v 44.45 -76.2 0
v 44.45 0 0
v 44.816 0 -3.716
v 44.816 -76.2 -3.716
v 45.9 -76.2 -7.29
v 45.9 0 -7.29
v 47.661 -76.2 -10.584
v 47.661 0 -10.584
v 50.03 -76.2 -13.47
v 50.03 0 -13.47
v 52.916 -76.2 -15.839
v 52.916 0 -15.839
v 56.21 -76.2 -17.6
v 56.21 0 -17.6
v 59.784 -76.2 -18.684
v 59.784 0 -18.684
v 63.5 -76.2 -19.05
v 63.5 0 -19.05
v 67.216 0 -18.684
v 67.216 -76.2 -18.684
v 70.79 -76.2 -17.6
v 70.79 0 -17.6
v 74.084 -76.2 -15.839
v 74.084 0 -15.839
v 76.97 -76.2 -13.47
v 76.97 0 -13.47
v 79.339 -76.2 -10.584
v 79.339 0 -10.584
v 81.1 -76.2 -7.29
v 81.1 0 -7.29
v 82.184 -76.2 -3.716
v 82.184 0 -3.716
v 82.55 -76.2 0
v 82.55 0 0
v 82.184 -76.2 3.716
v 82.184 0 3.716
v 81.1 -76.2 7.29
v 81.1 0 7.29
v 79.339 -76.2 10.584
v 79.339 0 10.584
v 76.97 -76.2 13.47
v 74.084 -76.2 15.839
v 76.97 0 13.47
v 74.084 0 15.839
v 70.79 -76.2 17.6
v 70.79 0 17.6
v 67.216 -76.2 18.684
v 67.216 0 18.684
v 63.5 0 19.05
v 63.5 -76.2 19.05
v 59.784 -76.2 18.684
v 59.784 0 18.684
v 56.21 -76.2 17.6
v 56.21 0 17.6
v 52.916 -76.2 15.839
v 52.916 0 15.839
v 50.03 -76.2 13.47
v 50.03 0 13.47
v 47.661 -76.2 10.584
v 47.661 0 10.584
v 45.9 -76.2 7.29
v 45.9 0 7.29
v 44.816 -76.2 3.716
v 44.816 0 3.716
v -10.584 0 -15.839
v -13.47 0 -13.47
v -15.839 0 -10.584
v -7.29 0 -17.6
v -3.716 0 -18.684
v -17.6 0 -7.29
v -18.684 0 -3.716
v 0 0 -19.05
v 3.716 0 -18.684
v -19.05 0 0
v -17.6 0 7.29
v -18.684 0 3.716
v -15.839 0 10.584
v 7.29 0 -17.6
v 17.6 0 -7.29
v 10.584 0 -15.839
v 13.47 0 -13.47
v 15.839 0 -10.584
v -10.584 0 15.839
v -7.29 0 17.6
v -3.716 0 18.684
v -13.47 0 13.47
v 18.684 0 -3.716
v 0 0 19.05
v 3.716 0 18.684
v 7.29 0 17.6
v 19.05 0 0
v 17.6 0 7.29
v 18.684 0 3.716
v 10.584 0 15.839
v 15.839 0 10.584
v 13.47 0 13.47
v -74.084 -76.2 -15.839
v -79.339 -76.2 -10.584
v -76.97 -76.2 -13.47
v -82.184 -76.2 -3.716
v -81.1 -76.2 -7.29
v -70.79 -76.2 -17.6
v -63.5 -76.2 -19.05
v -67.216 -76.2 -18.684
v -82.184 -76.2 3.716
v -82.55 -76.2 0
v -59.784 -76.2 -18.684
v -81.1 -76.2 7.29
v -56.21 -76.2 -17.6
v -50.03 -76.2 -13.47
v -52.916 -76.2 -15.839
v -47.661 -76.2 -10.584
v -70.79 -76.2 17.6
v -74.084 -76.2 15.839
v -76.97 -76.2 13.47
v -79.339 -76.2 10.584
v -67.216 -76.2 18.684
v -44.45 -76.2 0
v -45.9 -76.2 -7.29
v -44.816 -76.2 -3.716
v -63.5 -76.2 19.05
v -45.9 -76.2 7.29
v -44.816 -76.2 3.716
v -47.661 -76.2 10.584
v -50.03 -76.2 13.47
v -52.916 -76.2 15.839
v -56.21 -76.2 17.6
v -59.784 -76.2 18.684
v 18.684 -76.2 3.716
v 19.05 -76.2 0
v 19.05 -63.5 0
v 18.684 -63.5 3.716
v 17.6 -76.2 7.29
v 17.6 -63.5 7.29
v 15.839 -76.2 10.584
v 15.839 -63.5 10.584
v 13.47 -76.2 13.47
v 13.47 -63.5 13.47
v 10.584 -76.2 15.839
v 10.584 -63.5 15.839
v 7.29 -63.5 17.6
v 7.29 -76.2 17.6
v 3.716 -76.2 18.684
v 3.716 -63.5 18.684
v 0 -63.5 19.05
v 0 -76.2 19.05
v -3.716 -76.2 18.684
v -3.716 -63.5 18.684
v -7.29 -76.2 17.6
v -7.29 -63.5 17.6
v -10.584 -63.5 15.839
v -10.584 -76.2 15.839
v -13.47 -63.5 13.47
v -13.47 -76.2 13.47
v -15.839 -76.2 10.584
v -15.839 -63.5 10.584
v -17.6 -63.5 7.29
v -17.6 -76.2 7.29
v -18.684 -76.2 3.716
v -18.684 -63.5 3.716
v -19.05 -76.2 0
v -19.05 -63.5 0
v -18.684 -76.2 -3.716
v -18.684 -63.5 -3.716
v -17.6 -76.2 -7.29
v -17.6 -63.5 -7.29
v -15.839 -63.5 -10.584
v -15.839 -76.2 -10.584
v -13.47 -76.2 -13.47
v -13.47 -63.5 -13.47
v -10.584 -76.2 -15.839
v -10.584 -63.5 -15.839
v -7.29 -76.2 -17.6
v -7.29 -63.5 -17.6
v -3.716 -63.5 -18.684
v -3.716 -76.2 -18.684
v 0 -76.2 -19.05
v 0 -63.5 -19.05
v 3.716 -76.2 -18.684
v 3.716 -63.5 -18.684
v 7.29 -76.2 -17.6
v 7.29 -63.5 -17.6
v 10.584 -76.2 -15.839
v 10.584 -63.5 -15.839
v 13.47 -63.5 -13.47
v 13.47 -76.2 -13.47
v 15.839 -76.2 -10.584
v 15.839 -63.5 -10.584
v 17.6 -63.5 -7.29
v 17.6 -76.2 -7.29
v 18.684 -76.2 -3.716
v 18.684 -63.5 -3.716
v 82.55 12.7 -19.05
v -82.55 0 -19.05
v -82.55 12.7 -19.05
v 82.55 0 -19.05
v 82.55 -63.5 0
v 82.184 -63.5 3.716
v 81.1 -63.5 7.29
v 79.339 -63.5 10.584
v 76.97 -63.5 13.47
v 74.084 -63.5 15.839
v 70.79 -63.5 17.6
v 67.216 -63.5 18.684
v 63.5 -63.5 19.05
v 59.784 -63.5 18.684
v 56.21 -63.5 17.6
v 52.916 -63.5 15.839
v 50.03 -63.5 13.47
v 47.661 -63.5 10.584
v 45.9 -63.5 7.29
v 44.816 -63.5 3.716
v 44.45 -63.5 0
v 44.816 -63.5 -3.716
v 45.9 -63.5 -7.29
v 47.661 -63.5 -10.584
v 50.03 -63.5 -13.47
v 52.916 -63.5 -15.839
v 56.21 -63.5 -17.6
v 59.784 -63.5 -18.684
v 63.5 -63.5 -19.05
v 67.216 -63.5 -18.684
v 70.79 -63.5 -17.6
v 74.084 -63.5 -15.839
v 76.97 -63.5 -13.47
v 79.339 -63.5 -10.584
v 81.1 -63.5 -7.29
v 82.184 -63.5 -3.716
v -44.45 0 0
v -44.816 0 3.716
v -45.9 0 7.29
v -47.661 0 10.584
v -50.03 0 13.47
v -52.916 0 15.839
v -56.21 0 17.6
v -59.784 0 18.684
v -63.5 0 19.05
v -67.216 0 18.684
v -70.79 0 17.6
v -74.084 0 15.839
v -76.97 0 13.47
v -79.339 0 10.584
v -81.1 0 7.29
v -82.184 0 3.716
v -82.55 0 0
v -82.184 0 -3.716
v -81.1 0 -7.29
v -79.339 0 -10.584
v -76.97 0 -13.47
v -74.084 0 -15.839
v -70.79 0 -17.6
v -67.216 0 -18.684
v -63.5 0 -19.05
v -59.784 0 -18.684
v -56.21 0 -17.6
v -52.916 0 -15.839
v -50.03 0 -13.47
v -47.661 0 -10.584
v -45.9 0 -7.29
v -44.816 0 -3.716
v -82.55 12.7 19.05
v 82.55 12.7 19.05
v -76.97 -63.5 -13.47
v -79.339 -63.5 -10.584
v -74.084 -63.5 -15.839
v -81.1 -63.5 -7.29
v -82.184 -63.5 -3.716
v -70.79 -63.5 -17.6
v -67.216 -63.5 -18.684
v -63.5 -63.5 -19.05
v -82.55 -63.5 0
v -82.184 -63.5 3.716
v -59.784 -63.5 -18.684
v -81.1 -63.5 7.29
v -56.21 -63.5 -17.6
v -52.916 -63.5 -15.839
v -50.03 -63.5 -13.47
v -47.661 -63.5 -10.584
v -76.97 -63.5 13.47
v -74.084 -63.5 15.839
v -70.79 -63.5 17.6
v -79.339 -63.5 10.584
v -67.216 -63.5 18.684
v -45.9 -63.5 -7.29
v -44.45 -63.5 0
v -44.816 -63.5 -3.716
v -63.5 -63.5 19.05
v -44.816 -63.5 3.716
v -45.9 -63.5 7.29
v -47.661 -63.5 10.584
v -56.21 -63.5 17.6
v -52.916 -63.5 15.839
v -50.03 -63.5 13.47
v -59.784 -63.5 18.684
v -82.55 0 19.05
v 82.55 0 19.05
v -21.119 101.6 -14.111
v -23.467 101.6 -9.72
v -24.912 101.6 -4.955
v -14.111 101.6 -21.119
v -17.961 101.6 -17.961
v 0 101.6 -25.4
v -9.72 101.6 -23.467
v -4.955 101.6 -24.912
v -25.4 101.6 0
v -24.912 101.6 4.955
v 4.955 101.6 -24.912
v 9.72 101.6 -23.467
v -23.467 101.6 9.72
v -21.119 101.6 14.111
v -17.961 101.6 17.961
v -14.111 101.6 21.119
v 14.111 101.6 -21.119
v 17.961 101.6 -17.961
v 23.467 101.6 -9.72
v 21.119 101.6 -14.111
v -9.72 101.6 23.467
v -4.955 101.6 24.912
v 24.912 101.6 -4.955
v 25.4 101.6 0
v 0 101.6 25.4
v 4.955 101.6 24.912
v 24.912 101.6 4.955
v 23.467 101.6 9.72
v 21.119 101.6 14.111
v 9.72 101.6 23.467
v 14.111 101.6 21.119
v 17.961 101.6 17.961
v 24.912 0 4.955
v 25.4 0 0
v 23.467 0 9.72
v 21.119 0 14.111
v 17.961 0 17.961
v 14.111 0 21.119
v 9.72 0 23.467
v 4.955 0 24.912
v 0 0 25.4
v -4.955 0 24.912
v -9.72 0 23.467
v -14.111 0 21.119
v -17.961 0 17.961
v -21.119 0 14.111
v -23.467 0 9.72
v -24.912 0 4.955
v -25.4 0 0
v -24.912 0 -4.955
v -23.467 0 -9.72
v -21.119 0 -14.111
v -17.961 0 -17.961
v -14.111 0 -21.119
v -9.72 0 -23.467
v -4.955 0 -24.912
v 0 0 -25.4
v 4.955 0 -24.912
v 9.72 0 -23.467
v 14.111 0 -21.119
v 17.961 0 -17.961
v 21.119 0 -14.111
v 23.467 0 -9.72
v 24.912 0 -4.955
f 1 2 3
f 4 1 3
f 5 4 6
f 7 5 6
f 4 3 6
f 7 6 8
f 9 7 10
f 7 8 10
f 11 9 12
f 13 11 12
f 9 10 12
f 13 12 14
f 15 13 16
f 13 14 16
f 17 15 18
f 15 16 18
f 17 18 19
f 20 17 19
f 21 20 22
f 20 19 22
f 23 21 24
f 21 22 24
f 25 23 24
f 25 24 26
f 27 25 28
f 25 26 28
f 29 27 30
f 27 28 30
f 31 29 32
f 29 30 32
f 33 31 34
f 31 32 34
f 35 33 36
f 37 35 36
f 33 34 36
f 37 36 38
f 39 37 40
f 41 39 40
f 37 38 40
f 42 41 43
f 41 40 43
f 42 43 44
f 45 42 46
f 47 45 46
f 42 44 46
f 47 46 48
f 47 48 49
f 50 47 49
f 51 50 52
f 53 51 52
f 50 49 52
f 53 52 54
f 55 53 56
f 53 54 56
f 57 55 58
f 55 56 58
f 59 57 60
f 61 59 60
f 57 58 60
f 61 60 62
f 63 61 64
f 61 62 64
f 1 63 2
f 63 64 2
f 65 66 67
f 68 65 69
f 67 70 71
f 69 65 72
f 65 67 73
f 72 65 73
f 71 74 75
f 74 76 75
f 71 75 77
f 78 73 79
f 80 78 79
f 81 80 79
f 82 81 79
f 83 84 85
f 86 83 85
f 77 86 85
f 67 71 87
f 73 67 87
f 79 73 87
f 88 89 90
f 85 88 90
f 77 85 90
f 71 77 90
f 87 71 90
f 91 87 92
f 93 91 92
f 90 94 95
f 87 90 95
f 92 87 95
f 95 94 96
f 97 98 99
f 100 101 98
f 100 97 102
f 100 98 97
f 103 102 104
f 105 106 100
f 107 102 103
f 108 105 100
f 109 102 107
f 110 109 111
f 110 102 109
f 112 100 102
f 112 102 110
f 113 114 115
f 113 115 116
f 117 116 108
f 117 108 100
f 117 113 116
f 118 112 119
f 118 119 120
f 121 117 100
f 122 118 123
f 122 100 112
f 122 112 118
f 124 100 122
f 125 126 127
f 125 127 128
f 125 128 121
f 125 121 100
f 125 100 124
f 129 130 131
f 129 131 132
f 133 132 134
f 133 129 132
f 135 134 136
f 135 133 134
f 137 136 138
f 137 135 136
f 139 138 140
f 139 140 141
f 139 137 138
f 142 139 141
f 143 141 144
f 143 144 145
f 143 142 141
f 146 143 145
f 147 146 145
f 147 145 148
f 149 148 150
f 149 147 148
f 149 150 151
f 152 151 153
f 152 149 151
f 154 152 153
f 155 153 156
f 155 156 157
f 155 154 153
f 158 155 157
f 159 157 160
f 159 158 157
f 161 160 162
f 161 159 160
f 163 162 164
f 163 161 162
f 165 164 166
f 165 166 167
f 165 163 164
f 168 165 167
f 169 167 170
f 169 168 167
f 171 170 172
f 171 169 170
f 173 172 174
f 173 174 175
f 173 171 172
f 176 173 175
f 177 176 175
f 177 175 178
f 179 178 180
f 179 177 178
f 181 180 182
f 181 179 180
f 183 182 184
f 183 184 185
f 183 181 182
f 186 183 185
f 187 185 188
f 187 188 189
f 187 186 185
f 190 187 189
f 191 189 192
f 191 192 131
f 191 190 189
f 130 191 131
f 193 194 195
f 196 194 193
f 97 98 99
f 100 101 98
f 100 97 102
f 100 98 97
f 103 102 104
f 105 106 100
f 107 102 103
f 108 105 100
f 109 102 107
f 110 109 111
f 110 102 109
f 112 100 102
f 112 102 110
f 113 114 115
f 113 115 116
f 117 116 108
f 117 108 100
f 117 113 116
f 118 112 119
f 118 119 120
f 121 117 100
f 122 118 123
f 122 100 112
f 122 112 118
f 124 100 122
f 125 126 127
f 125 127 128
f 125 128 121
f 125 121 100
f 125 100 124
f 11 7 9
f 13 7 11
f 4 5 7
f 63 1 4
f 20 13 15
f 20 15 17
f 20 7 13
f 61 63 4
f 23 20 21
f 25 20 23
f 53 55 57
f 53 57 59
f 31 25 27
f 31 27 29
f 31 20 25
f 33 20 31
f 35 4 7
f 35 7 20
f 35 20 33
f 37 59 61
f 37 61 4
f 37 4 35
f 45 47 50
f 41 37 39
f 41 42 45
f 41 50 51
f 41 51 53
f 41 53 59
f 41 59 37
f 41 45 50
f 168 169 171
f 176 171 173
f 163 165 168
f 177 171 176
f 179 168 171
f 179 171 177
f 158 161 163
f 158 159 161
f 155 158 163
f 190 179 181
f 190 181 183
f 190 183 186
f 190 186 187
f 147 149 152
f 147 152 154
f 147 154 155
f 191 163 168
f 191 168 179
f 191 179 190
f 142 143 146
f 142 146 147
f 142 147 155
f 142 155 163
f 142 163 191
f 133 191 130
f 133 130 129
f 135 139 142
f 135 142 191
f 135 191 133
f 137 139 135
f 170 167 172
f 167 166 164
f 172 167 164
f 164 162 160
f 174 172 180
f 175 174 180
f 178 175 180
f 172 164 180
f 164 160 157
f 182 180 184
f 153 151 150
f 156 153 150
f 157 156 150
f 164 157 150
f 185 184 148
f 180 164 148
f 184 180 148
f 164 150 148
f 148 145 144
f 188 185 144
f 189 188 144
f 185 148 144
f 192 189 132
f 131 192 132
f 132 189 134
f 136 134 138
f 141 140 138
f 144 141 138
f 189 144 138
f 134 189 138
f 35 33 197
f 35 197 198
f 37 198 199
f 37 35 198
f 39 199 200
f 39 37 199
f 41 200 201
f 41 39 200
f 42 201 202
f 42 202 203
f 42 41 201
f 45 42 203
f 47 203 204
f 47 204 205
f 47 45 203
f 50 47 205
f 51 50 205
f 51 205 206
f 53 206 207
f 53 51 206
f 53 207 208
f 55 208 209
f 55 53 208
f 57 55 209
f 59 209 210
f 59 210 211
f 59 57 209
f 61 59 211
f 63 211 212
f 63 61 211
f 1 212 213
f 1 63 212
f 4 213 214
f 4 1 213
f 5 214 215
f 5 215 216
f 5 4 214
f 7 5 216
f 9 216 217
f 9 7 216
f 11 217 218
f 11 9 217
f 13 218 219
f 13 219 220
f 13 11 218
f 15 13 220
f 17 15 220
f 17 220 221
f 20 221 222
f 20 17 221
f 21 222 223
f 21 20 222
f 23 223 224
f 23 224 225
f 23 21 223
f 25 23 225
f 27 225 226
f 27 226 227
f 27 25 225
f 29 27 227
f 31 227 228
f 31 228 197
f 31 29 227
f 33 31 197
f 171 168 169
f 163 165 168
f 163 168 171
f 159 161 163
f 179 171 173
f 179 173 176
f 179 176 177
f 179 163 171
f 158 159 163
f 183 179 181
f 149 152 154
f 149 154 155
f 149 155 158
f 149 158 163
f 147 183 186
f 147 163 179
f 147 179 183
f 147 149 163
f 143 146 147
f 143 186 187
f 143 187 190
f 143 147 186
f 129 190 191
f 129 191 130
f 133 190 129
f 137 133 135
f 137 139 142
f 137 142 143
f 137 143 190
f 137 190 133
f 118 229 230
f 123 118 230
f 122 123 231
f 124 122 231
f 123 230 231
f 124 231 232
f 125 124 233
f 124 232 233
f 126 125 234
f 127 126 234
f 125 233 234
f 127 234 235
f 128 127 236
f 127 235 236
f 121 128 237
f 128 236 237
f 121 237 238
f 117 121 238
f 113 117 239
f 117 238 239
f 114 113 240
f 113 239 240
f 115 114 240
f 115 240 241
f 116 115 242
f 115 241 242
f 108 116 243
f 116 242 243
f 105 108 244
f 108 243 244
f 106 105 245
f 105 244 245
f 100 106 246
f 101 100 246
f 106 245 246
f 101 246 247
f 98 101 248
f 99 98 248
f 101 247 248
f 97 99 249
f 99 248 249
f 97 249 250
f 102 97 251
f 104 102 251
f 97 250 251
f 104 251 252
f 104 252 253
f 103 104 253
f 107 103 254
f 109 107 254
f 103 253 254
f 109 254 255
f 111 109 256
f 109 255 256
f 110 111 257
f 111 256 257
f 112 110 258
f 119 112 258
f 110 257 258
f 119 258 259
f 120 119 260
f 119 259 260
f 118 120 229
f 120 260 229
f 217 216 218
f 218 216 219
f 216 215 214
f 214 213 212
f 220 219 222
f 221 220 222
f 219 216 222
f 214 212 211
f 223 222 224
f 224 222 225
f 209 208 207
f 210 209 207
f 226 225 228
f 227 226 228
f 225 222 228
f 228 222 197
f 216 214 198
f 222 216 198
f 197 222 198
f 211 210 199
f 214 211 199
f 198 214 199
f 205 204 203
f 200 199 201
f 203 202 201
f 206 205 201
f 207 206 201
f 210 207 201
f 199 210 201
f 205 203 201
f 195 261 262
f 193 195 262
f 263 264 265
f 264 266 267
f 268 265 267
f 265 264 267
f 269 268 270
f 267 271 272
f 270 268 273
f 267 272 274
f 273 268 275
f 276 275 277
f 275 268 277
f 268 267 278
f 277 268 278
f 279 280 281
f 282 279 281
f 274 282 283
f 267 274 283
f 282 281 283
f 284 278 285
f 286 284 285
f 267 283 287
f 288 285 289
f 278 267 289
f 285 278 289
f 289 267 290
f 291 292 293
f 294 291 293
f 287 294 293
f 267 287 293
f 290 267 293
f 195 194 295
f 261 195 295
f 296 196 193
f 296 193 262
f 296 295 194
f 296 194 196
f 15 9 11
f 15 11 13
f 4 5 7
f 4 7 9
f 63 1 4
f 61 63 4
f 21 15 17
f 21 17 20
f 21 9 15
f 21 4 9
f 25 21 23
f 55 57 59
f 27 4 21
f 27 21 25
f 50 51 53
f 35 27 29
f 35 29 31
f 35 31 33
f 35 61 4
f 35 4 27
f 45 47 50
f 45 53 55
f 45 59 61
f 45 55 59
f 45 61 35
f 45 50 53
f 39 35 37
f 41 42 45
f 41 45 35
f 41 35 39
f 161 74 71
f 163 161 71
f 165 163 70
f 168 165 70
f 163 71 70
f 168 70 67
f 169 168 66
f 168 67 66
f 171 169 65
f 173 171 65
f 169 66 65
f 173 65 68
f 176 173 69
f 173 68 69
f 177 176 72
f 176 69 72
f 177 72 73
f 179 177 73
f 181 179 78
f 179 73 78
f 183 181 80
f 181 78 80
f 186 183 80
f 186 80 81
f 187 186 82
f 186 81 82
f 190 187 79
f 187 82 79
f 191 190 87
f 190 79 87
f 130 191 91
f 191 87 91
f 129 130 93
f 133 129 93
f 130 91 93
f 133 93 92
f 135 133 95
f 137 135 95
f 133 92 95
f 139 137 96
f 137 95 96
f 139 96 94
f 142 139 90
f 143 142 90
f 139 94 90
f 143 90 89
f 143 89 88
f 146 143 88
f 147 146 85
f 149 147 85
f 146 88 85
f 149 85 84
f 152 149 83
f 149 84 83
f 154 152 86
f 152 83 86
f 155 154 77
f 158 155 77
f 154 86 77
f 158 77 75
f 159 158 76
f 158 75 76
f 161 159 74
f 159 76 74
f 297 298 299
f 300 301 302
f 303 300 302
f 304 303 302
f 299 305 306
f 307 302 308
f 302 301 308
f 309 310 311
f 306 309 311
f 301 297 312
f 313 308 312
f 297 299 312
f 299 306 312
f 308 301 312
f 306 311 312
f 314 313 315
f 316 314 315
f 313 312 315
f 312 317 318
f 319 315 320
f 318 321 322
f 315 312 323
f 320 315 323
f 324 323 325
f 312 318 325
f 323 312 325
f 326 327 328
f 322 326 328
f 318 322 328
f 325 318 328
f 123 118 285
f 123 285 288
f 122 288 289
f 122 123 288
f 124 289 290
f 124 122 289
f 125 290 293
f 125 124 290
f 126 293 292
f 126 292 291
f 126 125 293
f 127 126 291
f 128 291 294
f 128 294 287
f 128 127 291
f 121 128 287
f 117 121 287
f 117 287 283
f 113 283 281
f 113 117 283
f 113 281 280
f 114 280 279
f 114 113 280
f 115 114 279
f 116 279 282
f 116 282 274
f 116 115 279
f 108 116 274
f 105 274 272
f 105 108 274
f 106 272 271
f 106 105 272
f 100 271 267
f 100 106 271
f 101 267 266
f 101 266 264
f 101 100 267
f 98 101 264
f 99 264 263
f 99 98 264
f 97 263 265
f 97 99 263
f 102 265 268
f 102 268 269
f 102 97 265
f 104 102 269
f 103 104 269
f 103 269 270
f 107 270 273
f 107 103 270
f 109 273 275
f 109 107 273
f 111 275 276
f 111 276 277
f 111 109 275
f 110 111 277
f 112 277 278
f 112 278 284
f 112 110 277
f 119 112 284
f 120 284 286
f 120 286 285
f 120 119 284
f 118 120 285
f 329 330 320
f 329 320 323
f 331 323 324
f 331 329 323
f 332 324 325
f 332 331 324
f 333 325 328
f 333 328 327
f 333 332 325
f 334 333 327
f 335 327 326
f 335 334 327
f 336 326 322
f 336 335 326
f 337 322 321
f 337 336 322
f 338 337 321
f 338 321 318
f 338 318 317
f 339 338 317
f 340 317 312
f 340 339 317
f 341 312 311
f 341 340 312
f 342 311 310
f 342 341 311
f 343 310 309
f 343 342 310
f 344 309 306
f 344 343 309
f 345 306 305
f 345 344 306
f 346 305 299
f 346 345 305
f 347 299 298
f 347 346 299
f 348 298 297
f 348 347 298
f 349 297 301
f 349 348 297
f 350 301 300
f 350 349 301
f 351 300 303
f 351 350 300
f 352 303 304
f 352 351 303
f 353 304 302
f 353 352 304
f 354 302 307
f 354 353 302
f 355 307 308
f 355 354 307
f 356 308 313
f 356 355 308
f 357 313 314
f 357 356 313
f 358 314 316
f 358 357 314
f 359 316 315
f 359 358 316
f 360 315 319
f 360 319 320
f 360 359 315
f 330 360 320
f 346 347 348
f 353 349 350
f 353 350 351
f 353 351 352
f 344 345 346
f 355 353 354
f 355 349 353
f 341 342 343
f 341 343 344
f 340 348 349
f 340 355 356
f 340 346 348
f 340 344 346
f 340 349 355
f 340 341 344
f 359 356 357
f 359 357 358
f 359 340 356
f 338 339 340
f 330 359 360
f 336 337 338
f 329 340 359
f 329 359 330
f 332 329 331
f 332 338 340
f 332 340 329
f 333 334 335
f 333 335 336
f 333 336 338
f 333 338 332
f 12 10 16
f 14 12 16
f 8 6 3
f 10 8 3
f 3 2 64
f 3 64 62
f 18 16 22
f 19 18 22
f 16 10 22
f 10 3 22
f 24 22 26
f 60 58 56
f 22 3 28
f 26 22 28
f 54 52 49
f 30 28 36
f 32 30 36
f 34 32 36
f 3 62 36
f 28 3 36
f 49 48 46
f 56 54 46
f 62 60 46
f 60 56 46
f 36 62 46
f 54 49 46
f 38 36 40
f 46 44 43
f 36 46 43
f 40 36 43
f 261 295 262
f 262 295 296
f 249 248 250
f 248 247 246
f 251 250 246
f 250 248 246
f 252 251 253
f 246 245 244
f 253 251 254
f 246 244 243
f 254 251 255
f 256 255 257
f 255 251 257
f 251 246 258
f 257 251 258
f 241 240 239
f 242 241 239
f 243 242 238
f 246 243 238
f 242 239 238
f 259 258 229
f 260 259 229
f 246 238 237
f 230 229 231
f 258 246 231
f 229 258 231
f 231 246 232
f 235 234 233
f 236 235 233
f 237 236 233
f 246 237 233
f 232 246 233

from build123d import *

# Parameters (mm, degrees)
F0_R      = 19.05
F1_DEPTH  = 76.2
F1_FACE_R = 19.05
F2_W      = 165.1
F2_H      = 38.1
F3_DEPTH  = 12.7
F4_R      = 25.4
F5_DEPTH  = 101.6


with BuildPart() as f1:
    # F0 (on Front) → F1 (new body)
    with BuildSketch(Plane.XZ):
        with BuildLine():
            ThreePointArc((82.55, 0), (63.5, 19.05), (44.45, 0))
            ThreePointArc((44.45, 0), (63.5, -19.05), (82.55, 0))
        make_face()
        with BuildLine():
            Line((0, 0), (19.05, 0))
            ThreePointArc((19.05, 0), (0, 19.05), (-19.05, 0))
            Line((-19.05, 0), (0, 0))
        make_face()
        with Locations((-63.5, 0)):
            Circle(F0_R)
        with BuildLine():
            ThreePointArc((-19.05, 0), (0, -19.05), (19.05, 0))
            Line((19.05, 0), (0, 0))
            Line((0, 0), (-19.05, 0))
        make_face()
    extrude(amount=F1_DEPTH)


with BuildPart() as f3:
    # F1_face (on face) + F2 (on Front) → F3 (new body)
    with BuildSketch(Plane(origin=(-63.5, -76.2, 0), x_dir=(1, 0, 0), z_dir=(0, -1, 0))):
        Circle(F1_FACE_R)
        with Locations((63.5, 0)):
            Circle(F1_FACE_R)
        with Locations((127, 0)):
            Circle(F1_FACE_R)
    with BuildSketch(Plane.XZ):
        Rectangle(F2_W, F2_H)
    extrude(amount=-F3_DEPTH)


with BuildPart() as f5:
    # F4 (on Front) → F5 (new body)
    with BuildSketch(Plane.XZ):
        Circle(F4_R)
    extrude(amount=-F5_DEPTH)


solid = Compound([f1.part, f3.part, f5.part])
